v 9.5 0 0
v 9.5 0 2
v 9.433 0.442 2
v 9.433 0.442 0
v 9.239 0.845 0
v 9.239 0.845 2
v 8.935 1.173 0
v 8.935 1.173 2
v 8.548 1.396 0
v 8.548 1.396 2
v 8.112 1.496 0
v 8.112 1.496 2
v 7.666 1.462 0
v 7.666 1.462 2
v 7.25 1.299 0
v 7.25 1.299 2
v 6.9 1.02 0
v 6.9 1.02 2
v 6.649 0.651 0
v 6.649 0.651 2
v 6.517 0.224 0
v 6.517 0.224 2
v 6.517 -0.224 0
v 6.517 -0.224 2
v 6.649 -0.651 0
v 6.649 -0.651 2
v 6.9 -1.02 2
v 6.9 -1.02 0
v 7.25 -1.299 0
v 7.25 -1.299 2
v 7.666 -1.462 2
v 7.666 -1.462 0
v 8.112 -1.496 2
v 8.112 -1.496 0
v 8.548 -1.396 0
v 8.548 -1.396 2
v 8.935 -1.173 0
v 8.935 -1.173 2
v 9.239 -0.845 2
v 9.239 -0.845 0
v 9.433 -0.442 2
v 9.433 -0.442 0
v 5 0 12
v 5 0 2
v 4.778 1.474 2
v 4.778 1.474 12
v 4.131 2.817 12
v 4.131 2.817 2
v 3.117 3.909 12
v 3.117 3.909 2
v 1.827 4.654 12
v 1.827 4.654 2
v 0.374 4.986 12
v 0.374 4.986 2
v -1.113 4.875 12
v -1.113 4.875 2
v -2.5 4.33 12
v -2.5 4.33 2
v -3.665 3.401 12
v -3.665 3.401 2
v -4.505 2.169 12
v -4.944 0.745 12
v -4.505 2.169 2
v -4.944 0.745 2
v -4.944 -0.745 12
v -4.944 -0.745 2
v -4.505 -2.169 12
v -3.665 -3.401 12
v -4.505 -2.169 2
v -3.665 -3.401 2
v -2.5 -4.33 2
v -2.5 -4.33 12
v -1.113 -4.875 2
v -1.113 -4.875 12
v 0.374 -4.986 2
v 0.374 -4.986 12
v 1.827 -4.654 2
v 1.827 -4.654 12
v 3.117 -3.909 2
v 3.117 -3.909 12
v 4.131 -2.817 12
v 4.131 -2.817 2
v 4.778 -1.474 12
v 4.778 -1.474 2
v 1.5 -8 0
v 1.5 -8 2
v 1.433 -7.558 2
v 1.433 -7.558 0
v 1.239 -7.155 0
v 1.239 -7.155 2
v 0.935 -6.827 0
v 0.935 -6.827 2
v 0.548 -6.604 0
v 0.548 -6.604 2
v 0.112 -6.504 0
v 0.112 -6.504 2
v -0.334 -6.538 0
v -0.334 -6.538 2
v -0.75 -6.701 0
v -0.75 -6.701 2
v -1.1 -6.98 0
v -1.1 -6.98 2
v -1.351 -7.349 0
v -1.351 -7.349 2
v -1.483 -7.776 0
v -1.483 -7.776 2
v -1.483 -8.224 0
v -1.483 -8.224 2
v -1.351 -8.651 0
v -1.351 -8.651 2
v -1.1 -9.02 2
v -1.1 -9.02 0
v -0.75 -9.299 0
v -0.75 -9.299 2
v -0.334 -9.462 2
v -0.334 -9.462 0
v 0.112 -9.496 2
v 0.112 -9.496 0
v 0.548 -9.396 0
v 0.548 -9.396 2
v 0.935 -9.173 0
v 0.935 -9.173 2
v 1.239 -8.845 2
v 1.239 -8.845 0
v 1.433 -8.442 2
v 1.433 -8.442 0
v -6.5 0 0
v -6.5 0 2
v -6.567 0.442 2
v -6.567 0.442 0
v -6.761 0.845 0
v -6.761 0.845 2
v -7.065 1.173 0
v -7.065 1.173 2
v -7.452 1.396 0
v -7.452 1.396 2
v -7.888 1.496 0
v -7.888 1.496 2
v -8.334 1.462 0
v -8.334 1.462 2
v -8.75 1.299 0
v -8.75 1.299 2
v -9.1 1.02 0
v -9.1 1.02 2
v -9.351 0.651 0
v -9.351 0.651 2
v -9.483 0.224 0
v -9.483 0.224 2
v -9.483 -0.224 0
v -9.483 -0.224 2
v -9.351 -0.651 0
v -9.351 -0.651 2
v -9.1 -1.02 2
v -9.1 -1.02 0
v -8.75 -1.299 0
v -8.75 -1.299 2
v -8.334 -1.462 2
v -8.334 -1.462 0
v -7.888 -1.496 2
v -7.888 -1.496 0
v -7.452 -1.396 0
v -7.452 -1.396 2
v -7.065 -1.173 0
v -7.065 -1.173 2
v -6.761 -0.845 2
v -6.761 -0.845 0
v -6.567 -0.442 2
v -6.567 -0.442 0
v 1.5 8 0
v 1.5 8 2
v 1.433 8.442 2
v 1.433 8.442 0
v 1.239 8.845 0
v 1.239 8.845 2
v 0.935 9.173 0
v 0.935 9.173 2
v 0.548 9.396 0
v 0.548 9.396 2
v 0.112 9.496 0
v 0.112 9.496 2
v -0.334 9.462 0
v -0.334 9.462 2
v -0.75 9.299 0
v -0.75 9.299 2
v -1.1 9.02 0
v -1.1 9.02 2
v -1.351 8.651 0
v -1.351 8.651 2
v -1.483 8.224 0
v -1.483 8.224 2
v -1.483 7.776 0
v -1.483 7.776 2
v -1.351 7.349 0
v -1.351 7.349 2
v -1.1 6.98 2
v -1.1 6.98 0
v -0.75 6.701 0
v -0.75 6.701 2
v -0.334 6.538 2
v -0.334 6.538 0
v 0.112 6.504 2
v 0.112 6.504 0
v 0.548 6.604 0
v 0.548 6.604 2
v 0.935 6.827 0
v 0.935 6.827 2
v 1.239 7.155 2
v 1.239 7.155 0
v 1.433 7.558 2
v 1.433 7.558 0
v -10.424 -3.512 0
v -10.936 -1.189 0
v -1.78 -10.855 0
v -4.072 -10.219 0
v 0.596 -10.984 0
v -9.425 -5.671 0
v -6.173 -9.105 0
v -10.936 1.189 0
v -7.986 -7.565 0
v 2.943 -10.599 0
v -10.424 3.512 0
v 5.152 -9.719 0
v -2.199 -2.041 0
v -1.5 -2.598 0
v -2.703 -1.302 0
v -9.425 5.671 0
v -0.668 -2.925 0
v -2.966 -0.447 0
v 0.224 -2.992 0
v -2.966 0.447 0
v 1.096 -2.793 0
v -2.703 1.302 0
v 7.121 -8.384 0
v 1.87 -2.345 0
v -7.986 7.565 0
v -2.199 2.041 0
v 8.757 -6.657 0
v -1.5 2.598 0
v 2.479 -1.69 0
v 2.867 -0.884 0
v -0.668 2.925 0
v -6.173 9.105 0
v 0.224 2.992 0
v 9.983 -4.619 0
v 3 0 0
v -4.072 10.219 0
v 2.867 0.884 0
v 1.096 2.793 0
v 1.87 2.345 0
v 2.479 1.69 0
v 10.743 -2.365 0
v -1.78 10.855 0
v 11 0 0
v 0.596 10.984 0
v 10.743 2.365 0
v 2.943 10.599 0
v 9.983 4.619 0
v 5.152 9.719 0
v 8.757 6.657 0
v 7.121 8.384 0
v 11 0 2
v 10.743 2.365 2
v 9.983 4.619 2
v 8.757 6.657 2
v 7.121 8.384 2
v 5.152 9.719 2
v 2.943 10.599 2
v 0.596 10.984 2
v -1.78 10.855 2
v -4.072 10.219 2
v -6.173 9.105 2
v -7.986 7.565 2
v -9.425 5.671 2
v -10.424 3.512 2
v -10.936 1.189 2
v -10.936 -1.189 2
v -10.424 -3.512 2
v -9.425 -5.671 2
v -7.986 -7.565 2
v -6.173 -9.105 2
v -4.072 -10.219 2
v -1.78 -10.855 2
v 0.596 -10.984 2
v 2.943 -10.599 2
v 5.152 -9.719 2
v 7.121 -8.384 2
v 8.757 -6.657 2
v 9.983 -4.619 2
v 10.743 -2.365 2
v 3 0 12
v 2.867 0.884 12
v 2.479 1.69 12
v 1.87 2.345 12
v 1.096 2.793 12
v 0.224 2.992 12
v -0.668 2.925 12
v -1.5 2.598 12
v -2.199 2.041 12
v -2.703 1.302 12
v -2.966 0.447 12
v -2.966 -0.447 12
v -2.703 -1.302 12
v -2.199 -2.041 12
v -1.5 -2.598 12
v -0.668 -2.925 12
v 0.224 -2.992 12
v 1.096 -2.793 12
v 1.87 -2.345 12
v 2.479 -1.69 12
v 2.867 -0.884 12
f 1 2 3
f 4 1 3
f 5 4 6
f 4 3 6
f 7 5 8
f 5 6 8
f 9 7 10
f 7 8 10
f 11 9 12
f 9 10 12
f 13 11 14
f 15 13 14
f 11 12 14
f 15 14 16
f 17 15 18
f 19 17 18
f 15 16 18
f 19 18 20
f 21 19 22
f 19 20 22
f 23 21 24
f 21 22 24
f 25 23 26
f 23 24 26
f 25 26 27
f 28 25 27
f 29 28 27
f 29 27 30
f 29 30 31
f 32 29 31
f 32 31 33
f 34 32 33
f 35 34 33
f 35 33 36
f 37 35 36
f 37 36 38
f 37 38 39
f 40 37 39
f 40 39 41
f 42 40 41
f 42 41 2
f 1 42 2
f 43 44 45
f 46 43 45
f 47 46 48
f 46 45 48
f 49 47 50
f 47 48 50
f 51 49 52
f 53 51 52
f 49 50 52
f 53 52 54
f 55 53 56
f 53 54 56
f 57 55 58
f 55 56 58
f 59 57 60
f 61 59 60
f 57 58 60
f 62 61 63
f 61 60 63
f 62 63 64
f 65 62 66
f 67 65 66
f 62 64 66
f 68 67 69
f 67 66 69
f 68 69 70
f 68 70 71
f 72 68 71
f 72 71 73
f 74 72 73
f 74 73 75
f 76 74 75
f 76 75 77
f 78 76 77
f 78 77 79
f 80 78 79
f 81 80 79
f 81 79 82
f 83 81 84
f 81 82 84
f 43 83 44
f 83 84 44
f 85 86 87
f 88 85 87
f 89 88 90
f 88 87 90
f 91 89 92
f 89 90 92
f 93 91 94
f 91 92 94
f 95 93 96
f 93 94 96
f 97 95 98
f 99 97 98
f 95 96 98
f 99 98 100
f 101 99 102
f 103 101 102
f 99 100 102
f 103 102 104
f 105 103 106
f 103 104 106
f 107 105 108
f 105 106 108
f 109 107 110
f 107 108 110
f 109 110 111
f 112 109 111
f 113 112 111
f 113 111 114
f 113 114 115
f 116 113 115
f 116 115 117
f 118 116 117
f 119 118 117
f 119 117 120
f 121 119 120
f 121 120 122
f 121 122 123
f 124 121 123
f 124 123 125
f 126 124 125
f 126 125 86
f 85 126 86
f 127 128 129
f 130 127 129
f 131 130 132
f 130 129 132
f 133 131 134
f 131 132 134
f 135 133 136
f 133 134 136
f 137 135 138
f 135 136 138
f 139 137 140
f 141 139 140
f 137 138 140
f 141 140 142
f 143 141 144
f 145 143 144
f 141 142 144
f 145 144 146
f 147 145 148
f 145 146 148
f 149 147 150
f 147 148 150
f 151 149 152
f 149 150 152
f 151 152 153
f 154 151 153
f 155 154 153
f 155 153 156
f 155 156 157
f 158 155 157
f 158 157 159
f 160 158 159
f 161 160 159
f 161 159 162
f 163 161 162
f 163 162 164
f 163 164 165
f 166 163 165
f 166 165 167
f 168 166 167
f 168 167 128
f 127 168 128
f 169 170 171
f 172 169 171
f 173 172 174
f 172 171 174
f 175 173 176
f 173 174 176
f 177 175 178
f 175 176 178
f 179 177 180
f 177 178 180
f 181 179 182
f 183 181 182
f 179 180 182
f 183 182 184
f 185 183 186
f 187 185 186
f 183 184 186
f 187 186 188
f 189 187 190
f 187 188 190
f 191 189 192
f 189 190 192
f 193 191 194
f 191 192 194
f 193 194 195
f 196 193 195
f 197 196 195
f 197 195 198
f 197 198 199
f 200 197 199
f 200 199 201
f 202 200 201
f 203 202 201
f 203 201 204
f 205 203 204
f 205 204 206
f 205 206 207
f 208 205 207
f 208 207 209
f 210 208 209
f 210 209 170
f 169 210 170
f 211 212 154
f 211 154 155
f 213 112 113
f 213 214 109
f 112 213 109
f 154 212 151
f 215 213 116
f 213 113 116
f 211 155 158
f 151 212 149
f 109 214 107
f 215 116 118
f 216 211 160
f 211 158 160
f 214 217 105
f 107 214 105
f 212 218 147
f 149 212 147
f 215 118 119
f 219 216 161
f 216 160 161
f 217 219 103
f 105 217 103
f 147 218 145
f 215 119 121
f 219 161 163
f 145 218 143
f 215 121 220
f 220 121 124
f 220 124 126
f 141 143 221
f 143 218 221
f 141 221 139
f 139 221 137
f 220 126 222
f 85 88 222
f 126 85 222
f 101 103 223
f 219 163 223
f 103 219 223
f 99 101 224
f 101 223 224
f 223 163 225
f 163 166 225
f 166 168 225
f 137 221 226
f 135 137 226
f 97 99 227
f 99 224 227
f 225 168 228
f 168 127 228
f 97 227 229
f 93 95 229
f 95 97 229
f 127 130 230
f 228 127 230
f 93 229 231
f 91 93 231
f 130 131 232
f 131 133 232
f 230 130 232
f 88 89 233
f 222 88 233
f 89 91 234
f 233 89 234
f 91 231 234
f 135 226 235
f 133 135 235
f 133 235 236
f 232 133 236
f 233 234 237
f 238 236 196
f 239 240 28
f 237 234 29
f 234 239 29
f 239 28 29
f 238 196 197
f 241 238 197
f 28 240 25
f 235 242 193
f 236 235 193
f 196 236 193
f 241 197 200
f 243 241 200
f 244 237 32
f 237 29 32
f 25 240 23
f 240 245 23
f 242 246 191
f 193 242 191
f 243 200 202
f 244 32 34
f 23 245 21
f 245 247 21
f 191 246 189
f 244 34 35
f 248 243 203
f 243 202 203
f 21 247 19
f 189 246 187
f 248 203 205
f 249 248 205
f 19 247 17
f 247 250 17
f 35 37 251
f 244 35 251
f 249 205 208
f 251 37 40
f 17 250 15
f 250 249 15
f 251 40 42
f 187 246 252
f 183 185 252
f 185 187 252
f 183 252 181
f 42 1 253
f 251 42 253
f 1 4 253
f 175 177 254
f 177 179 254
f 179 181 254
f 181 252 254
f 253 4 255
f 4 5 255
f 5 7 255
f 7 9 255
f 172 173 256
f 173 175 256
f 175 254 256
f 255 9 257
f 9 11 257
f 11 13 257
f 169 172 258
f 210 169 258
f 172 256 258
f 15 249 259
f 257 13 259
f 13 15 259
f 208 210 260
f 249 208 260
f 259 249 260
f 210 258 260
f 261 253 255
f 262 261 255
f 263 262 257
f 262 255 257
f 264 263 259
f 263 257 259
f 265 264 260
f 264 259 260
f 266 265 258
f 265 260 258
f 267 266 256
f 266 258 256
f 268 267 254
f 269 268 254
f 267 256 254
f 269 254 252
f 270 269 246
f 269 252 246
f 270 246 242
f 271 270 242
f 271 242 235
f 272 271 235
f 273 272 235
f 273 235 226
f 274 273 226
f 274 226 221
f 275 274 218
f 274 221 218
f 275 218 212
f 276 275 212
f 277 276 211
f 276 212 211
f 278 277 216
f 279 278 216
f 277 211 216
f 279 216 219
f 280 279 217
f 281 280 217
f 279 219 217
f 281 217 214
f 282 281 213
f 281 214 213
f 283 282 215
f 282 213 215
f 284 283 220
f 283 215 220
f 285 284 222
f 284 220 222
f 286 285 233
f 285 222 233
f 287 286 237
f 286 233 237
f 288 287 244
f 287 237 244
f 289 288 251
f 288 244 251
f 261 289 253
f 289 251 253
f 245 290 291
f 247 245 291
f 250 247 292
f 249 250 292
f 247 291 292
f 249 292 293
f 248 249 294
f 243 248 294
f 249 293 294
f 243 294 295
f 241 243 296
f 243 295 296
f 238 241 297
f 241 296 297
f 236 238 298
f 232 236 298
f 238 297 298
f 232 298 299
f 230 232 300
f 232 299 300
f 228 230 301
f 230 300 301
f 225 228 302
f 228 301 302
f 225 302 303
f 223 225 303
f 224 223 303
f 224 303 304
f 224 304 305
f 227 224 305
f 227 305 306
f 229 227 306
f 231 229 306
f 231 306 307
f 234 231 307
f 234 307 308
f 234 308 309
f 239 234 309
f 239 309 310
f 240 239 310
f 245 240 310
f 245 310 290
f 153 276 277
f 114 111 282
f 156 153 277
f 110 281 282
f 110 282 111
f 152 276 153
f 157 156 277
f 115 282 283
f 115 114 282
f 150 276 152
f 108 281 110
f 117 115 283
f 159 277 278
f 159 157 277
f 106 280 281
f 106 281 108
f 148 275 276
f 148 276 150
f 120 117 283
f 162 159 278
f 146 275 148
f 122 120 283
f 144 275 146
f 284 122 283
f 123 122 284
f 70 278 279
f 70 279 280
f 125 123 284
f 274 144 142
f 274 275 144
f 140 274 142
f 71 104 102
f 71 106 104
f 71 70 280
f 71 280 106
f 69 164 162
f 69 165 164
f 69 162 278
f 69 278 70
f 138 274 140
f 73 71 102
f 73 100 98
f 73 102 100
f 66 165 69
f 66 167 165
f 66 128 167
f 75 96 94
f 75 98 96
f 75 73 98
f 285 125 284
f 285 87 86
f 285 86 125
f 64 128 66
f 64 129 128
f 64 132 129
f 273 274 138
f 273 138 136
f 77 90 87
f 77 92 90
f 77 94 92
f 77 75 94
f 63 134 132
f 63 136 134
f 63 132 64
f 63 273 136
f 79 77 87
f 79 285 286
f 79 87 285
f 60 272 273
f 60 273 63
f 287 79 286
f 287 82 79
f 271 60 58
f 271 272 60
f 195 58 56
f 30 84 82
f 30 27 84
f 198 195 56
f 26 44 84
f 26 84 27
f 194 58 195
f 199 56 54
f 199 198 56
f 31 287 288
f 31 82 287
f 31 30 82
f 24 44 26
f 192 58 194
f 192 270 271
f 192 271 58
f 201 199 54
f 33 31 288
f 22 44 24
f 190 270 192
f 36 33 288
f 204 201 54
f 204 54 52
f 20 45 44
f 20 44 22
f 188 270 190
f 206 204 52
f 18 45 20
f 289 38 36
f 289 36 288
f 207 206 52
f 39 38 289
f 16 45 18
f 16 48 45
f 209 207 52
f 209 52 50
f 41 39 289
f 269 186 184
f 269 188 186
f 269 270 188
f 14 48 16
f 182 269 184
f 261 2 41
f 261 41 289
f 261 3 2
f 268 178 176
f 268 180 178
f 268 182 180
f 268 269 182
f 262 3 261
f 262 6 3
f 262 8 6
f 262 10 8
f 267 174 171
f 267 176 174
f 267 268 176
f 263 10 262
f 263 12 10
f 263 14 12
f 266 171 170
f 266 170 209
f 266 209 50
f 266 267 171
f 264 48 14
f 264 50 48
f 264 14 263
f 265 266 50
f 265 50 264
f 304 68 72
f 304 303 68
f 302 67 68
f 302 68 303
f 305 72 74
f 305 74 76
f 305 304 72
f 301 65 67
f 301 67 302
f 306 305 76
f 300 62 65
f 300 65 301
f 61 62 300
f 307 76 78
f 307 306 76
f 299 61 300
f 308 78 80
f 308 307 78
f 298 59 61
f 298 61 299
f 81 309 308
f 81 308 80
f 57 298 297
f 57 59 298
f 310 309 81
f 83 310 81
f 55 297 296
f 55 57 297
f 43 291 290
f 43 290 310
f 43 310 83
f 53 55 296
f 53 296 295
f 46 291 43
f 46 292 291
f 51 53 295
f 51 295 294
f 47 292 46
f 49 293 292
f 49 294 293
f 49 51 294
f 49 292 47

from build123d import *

# Parameters (mm, degrees)
SKETCH_1_R          = 11
EXTRUDE_1_DEPTH     = 2
SKETCH_2_R          = 5
EXTRUDE_2_DEPTH     = 10
SKETCH_4_R          = 3
CUT_EXTRUDE_2_DEPTH = 13
CUT_EXTRUDE_3_REACH = 4
SKETCH_5_R          = 1.5


with BuildPart() as part:
    # 草图1 → 凸台-拉伸1 (new body)
    with BuildSketch(Plane.XY):
        Circle(SKETCH_1_R)
    extrude(amount=EXTRUDE_1_DEPTH)

    # 草图2 → 凸台-拉伸2 (add)
    with BuildSketch(Plane.XY.offset(2)):
        Circle(SKETCH_2_R)
    extrude(amount=EXTRUDE_2_DEPTH)

    # 草图4 → 切除-拉伸2 (cut, through all)
    with BuildSketch(Plane.XY.offset(12)):
        Circle(SKETCH_4_R)
    extrude(amount=-CUT_EXTRUDE_2_DEPTH, mode=Mode.SUBTRACT)

    # 草图5 → 切除-拉伸3 (cut, up to next)
    with BuildSketch(Plane.XY.offset(2), mode=Mode.PRIVATE) as cut_extrude_3_sk1:
        with Locations((-8, 0)):
            Circle(SKETCH_5_R)
    cut_extrude_3_tool1 = extrude(cut_extrude_3_sk1.sketch, amount=-CUT_EXTRUDE_3_REACH, mode=Mode.PRIVATE) & part.part
    add(cut_extrude_3_tool1.solids().sort_by_distance((-8, 0, 2))[0], mode=Mode.SUBTRACT)
    # 草图5 → 切除-拉伸3 (cut, up to next)
    with BuildSketch(Plane.XY.offset(2), mode=Mode.PRIVATE) as cut_extrude_3_sk2:
        with Locations((0, 8)):
            Circle(SKETCH_5_R)
    cut_extrude_3_tool2 = extrude(cut_extrude_3_sk2.sketch, amount=-CUT_EXTRUDE_3_REACH, mode=Mode.PRIVATE) & part.part
    add(cut_extrude_3_tool2.solids().sort_by_distance((0, 8, 2))[0], mode=Mode.SUBTRACT)
    # 草图5 → 切除-拉伸3 (cut, up to next)
    with BuildSketch(Plane.XY.offset(2), mode=Mode.PRIVATE) as cut_extrude_3_sk3:
        with Locations((8, 0)):
            Circle(SKETCH_5_R)
    cut_extrude_3_tool3 = extrude(cut_extrude_3_sk3.sketch, amount=-CUT_EXTRUDE_3_REACH, mode=Mode.PRIVATE) & part.part
    add(cut_extrude_3_tool3.solids().sort_by_distance((8, 0, 2))[0], mode=Mode.SUBTRACT)
    # 草图5 → 切除-拉伸3 (cut, up to next)
    with BuildSketch(Plane.XY.offset(2), mode=Mode.PRIVATE) as cut_extrude_3_sk4:
        with Locations((0, -8)):
            Circle(SKETCH_5_R)
    cut_extrude_3_tool4 = extrude(cut_extrude_3_sk4.sketch, amount=-CUT_EXTRUDE_3_REACH, mode=Mode.PRIVATE) & part.part
    add(cut_extrude_3_tool4.solids().sort_by_distance((0, -8, 2))[0], mode=Mode.SUBTRACT)


solid = part.part
